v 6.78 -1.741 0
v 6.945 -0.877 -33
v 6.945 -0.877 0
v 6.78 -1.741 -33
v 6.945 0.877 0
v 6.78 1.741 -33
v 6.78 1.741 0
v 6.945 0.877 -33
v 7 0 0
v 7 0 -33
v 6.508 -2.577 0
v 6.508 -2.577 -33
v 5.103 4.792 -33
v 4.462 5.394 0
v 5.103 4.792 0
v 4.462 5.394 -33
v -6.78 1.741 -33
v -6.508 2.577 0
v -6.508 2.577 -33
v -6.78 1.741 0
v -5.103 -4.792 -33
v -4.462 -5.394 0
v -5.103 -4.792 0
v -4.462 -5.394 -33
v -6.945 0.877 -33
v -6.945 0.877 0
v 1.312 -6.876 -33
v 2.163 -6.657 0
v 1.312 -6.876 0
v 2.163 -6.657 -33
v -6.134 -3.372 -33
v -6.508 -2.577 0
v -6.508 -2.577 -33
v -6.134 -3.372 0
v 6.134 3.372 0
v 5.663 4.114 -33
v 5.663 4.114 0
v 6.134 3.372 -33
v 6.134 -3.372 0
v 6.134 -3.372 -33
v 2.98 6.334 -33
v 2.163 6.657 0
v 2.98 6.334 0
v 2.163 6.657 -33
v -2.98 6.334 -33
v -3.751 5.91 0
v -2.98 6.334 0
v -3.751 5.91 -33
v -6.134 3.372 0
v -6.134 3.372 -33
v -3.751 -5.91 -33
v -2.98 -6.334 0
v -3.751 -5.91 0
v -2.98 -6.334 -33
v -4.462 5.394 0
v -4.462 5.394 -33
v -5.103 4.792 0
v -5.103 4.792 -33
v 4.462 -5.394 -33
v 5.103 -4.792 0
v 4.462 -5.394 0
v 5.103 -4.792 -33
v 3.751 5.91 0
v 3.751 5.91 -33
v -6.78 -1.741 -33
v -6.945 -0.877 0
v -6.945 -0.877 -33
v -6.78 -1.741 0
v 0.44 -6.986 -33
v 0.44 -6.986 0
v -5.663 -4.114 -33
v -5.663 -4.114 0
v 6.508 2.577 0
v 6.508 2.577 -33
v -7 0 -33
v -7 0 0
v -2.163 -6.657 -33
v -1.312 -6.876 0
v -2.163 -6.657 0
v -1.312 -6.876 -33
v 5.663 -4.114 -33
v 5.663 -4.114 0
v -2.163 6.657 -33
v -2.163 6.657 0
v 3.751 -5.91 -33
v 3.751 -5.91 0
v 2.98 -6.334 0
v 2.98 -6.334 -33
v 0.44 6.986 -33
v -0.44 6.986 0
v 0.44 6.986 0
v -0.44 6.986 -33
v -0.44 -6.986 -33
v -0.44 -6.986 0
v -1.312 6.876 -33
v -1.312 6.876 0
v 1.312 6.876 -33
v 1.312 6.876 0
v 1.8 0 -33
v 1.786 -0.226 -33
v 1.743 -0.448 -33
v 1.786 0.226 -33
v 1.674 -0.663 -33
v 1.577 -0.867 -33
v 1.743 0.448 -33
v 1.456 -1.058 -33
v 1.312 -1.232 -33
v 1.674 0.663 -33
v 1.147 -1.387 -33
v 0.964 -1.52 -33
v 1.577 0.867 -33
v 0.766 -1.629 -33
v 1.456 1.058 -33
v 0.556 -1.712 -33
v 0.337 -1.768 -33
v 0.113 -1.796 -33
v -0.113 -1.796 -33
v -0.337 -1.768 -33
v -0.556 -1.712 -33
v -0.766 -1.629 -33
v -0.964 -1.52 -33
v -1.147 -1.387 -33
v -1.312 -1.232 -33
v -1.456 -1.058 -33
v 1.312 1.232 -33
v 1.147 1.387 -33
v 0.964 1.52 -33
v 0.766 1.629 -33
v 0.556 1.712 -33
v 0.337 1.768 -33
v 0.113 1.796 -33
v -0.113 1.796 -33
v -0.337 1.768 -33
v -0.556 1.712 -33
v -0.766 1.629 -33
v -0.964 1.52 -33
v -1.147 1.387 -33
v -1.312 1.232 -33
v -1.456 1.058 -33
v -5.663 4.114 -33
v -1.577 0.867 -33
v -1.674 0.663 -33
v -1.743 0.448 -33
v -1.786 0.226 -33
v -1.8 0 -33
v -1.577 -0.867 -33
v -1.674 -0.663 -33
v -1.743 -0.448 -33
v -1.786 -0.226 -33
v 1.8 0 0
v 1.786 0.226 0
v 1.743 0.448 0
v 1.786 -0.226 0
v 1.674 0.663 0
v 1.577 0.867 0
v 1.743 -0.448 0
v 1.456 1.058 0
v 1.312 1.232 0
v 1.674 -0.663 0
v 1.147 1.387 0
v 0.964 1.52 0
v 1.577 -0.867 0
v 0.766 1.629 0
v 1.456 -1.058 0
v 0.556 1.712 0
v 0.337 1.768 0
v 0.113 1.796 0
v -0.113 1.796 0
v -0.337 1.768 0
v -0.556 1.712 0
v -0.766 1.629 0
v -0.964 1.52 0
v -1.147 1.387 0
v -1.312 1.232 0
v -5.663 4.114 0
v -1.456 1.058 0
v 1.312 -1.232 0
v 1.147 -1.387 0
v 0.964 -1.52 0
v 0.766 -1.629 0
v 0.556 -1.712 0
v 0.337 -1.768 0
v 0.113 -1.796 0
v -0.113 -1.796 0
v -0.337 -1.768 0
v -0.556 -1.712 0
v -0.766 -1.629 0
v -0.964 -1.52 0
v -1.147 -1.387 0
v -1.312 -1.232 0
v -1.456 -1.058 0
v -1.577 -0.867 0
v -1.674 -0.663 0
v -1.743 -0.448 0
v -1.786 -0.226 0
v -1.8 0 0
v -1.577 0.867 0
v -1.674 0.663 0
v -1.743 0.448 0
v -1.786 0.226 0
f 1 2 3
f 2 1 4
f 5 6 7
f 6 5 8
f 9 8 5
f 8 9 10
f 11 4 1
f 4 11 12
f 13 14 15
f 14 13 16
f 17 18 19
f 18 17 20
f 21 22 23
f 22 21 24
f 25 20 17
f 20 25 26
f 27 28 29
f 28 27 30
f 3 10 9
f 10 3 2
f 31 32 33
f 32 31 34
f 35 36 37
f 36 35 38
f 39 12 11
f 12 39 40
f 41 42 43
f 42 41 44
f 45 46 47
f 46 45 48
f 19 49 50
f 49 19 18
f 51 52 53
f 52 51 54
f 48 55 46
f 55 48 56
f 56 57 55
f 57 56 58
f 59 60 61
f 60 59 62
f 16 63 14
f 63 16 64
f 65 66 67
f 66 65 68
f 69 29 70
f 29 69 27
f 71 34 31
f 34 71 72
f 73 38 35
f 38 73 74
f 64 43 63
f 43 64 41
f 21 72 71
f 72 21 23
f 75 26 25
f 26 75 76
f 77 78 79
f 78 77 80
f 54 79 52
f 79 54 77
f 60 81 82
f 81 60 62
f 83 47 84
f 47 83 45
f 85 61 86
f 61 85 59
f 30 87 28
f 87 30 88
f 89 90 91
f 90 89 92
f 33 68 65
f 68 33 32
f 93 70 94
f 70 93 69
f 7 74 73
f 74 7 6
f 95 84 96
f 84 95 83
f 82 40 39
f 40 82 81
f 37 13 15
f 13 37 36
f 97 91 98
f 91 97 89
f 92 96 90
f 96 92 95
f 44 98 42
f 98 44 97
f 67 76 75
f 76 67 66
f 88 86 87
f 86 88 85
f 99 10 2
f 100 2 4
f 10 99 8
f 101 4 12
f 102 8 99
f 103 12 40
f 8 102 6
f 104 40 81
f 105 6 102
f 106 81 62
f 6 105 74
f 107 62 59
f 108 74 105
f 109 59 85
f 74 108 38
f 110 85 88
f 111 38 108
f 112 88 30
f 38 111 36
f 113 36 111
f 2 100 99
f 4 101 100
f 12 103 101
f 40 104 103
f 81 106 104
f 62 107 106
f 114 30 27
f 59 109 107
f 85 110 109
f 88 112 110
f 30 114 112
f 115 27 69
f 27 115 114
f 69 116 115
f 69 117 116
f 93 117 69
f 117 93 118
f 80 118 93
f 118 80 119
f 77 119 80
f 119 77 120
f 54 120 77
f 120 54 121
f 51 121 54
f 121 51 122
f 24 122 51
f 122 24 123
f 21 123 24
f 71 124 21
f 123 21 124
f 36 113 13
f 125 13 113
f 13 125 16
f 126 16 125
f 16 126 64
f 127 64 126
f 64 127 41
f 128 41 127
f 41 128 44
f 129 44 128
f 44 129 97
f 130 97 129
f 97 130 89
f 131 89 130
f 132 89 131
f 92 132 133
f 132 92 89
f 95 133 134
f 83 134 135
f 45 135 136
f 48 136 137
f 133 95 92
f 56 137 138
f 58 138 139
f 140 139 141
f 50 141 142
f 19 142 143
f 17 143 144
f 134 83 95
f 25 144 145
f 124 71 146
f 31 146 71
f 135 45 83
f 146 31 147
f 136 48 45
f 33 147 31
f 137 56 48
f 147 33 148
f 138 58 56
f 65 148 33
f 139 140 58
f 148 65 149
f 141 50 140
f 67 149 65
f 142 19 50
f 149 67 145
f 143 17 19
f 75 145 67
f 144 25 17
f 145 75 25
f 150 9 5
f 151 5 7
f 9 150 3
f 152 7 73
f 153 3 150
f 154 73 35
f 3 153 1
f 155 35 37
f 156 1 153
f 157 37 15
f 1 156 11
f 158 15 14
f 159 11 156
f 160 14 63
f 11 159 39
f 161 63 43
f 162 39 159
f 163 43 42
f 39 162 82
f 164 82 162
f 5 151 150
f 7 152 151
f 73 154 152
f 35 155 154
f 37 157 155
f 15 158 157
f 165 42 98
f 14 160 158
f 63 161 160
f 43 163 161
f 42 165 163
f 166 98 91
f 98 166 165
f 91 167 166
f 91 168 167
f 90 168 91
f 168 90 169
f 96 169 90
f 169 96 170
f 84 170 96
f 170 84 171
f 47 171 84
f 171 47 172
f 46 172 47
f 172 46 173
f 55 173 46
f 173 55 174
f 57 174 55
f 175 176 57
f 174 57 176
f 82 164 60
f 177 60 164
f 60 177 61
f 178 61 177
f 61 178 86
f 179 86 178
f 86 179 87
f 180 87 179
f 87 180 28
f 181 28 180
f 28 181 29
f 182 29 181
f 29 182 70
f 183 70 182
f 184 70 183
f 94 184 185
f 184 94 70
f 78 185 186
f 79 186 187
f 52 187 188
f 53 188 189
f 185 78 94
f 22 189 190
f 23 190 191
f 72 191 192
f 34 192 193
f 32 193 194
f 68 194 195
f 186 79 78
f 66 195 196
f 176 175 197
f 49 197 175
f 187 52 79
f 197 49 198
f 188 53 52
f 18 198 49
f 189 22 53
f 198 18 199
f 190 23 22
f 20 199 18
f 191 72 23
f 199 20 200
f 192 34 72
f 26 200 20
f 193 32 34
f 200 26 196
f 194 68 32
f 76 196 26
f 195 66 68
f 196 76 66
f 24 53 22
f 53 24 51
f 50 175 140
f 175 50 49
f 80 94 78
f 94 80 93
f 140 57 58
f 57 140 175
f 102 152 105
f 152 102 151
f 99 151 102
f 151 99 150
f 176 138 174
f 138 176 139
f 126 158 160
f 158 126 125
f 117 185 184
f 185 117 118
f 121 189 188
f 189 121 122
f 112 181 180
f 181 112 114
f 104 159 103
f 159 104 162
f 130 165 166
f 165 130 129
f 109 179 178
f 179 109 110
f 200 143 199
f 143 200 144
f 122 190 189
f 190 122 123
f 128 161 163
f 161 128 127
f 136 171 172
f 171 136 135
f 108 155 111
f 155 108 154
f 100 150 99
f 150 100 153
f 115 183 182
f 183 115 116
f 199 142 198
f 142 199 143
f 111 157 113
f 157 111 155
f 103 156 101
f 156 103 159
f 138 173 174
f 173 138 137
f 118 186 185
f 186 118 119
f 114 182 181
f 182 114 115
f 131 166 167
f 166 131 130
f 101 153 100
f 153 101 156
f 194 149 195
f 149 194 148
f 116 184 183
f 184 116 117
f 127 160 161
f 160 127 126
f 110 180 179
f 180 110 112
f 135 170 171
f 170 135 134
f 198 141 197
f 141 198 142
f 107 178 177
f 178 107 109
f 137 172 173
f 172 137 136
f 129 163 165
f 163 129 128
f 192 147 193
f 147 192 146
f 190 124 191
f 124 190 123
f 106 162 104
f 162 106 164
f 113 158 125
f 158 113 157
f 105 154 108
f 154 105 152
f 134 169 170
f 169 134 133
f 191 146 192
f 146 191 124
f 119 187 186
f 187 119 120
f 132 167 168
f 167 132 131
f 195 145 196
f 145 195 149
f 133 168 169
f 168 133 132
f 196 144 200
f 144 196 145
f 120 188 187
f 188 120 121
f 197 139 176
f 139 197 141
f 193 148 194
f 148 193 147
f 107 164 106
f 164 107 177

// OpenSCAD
$fn = 50;


difference() {
	union() {
		translate(v = [0, 0, -33.0000000000]) {
			cylinder(h = 33, r = 7.0000000000);
		}
		cylinder(h = 0, r = 16.0000000000);
	}
	union() {
		#translate(v = [0, 0, -33]) {
			cylinder(h = 33, r = 1.8000000000);
		}
	}
}
